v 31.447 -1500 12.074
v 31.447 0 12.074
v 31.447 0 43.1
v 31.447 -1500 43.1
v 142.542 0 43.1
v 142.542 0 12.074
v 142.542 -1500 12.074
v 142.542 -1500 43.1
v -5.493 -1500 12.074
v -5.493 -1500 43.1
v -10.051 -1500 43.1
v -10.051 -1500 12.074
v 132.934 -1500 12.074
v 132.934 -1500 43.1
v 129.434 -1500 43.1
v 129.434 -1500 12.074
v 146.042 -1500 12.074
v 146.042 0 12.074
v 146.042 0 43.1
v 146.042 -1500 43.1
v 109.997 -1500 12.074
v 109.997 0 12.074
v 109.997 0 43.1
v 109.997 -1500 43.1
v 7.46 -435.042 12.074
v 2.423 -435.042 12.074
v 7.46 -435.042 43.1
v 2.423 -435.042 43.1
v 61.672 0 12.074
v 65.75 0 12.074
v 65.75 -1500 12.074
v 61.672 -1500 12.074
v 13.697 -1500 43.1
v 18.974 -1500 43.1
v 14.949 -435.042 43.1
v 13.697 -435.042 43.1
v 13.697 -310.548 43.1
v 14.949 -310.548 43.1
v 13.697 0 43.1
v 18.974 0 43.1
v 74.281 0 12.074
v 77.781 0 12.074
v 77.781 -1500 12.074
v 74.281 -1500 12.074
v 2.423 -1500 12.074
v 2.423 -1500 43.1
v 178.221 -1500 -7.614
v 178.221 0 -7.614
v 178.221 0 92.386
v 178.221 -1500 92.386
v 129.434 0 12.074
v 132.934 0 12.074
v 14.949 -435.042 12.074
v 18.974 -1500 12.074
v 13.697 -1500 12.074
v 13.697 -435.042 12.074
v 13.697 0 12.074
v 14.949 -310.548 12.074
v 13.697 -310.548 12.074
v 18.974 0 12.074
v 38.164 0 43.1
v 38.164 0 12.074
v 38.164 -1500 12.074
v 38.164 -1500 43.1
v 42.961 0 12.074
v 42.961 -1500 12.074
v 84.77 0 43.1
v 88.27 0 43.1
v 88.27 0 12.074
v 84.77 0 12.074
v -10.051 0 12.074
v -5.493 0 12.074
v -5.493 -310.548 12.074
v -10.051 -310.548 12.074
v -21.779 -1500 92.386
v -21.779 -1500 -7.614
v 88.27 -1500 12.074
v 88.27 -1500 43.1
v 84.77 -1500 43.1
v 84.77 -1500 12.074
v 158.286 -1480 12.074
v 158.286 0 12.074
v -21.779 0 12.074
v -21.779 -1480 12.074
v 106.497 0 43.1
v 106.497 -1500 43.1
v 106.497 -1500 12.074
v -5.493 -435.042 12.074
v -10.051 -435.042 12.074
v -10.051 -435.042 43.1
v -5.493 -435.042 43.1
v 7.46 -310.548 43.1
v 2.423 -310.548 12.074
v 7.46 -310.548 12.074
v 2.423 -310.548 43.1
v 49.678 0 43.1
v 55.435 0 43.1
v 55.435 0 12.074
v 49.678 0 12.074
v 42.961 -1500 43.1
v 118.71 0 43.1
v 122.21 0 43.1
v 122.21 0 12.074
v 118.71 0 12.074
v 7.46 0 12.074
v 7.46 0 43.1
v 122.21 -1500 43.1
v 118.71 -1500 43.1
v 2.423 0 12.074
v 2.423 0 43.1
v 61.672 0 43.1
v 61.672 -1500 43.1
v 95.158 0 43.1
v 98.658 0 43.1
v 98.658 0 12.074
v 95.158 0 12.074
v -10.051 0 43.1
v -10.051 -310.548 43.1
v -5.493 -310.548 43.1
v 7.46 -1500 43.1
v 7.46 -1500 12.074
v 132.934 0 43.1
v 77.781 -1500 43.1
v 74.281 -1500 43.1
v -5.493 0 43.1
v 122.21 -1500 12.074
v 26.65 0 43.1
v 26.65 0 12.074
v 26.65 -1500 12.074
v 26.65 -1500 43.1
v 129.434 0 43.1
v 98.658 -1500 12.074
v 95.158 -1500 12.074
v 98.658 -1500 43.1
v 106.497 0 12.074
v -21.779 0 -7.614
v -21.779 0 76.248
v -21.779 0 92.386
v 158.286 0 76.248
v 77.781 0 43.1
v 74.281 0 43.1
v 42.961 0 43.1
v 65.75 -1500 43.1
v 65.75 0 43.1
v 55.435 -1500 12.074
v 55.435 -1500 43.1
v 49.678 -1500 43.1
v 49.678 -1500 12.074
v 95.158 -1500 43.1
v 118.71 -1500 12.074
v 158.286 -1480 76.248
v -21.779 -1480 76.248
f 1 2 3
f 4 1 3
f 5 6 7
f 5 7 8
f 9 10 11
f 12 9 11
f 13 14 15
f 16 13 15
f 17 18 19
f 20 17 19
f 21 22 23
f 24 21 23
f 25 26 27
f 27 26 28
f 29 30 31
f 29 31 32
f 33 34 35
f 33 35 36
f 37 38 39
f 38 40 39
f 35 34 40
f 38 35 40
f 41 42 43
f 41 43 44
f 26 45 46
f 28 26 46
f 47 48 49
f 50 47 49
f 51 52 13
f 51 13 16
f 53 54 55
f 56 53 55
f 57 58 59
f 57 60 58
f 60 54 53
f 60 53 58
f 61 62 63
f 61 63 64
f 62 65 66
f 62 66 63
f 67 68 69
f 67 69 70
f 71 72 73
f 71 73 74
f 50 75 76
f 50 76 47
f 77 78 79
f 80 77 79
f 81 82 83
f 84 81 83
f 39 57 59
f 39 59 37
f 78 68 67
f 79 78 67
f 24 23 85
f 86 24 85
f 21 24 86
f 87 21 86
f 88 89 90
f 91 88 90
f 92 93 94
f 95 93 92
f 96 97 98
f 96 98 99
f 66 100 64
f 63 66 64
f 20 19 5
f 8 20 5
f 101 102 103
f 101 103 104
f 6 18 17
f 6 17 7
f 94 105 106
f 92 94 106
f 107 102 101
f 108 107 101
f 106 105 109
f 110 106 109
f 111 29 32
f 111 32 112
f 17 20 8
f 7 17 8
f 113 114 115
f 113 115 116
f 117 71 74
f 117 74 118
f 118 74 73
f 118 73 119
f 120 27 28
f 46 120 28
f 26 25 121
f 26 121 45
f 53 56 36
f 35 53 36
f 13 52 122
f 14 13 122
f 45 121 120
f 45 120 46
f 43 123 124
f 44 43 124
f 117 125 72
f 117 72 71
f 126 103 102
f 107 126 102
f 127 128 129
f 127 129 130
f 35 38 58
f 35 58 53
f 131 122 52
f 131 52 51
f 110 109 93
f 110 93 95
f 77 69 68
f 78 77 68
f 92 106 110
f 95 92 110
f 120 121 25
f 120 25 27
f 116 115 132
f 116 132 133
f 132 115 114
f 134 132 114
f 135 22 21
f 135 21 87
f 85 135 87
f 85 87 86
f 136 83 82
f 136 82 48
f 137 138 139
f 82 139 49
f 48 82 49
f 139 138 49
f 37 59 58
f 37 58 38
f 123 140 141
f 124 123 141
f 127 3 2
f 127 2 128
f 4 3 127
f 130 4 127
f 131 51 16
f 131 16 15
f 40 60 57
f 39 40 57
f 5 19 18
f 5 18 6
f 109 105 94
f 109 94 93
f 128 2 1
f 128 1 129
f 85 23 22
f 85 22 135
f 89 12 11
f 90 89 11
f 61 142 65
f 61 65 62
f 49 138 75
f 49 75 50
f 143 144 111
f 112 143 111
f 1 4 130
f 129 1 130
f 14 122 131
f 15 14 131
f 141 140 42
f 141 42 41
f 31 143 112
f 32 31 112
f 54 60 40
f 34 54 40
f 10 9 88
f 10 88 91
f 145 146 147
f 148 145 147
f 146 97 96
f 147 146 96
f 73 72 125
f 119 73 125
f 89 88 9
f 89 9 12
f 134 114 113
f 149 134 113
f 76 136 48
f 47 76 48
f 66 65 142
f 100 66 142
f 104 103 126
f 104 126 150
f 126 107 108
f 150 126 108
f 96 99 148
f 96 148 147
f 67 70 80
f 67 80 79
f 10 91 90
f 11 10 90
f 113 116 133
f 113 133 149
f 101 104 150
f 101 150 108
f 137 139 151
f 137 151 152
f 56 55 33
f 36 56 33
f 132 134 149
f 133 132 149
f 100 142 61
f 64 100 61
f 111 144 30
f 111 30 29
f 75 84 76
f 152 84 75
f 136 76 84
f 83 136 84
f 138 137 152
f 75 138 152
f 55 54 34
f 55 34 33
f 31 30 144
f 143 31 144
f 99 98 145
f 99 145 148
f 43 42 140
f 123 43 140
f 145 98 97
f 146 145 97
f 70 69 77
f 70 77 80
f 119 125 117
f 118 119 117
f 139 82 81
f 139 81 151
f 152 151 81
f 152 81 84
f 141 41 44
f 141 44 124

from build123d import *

# Parameters (mm, degrees)
F0_W     = 200
F0_H     = 100
F1_DEPTH = 1500
F2_W     = 180.065
F2_H     = 64.174236
F3_DEPTH = 1480
F4_W     = 3.5
F4_H     = 31.025586
F4_W_2   = 4.077878
F4_W_3   = 5.757004
F4_W_4   = 4.7975
F4_W_5   = 4.797503
F4_W_6   = 5.277252
F4_W_7   = 5.037379
F4_W_8   = 4.557629
F5_DEPTH = 1500
F6_W     = 124.494672
F6_H     = 31.025586
F7_DEPTH = 25


with BuildPart() as f1:
    # F0 (on Front) → F1 (new body)
    with BuildSketch(Plane.XZ):
        with Locations((78.220573, 42.386252)):
            Rectangle(F0_W, F0_H)
    extrude(amount=F1_DEPTH)

    # F2 (on face) → F3 (cut)
    with BuildSketch(Plane(origin=(0, 0, 0), x_dir=(-1, 0, 0), z_dir=(0, 1, 0))):
        with Locations((-68.253073, 44.161043)):
            Rectangle(F2_W, F2_H)
    extrude(amount=-F3_DEPTH, mode=Mode.SUBTRACT)


with BuildPart() as f5:
    # F4 (on face) → F5 (new body)
    with BuildSketch(Plane(origin=(0, 0, 0), x_dir=(-1, 0, 0), z_dir=(0, 1, 0))):
        with Locations((-144.291662, 27.586718)):
            Rectangle(F4_W, F4_H)
        with Locations((-131.184466, 27.586718)):
            Rectangle(F4_W, F4_H)
        with Locations((-120.460406, 27.586718)):
            Rectangle(F4_W, F4_H)
        with Locations((-108.246878, 27.586718)):
            Rectangle(F4_W, F4_H)
        with Locations((-96.908487, 27.586718)):
            Rectangle(F4_W, F4_H)
        with Locations((-86.520418, 27.586718)):
            Rectangle(F4_W, F4_H)
        with Locations((-76.031491, 27.586718)):
            Rectangle(F4_W, F4_H)
        with Locations((-63.710632, 27.586718)):
            Rectangle(F4_W_2, F4_H)
        with Locations((-52.55644, 27.586718)):
            Rectangle(F4_W_3, F4_H)
        with Locations((-40.562684, 27.586718)):
            Rectangle(F4_W_4, F4_H)
        with Locations((-29.048677, 27.586718)):
            Rectangle(F4_W_5, F4_H)
        with Locations((-16.335296, 27.586718)):
            Rectangle(F4_W_6, F4_H)
        with Locations((-4.941229, 27.586718)):
            Rectangle(F4_W_7, F4_H)
        with Locations((7.772153, 27.586718)):
            Rectangle(F4_W_8, F4_H)
    extrude(amount=-F5_DEPTH)

    # F6 (on face) → F7 (cut)
    with BuildSketch(Plane(origin=(-10.050968, 0, 0), x_dir=(0, -1, 0), z_dir=(-1, 0, 0))):
        with Locations((372.794926, 27.586718)):
            Rectangle(F6_W, F6_H)
    extrude(amount=-F7_DEPTH, mode=Mode.SUBTRACT)


solid = Compound([f1.part, f5.part])
